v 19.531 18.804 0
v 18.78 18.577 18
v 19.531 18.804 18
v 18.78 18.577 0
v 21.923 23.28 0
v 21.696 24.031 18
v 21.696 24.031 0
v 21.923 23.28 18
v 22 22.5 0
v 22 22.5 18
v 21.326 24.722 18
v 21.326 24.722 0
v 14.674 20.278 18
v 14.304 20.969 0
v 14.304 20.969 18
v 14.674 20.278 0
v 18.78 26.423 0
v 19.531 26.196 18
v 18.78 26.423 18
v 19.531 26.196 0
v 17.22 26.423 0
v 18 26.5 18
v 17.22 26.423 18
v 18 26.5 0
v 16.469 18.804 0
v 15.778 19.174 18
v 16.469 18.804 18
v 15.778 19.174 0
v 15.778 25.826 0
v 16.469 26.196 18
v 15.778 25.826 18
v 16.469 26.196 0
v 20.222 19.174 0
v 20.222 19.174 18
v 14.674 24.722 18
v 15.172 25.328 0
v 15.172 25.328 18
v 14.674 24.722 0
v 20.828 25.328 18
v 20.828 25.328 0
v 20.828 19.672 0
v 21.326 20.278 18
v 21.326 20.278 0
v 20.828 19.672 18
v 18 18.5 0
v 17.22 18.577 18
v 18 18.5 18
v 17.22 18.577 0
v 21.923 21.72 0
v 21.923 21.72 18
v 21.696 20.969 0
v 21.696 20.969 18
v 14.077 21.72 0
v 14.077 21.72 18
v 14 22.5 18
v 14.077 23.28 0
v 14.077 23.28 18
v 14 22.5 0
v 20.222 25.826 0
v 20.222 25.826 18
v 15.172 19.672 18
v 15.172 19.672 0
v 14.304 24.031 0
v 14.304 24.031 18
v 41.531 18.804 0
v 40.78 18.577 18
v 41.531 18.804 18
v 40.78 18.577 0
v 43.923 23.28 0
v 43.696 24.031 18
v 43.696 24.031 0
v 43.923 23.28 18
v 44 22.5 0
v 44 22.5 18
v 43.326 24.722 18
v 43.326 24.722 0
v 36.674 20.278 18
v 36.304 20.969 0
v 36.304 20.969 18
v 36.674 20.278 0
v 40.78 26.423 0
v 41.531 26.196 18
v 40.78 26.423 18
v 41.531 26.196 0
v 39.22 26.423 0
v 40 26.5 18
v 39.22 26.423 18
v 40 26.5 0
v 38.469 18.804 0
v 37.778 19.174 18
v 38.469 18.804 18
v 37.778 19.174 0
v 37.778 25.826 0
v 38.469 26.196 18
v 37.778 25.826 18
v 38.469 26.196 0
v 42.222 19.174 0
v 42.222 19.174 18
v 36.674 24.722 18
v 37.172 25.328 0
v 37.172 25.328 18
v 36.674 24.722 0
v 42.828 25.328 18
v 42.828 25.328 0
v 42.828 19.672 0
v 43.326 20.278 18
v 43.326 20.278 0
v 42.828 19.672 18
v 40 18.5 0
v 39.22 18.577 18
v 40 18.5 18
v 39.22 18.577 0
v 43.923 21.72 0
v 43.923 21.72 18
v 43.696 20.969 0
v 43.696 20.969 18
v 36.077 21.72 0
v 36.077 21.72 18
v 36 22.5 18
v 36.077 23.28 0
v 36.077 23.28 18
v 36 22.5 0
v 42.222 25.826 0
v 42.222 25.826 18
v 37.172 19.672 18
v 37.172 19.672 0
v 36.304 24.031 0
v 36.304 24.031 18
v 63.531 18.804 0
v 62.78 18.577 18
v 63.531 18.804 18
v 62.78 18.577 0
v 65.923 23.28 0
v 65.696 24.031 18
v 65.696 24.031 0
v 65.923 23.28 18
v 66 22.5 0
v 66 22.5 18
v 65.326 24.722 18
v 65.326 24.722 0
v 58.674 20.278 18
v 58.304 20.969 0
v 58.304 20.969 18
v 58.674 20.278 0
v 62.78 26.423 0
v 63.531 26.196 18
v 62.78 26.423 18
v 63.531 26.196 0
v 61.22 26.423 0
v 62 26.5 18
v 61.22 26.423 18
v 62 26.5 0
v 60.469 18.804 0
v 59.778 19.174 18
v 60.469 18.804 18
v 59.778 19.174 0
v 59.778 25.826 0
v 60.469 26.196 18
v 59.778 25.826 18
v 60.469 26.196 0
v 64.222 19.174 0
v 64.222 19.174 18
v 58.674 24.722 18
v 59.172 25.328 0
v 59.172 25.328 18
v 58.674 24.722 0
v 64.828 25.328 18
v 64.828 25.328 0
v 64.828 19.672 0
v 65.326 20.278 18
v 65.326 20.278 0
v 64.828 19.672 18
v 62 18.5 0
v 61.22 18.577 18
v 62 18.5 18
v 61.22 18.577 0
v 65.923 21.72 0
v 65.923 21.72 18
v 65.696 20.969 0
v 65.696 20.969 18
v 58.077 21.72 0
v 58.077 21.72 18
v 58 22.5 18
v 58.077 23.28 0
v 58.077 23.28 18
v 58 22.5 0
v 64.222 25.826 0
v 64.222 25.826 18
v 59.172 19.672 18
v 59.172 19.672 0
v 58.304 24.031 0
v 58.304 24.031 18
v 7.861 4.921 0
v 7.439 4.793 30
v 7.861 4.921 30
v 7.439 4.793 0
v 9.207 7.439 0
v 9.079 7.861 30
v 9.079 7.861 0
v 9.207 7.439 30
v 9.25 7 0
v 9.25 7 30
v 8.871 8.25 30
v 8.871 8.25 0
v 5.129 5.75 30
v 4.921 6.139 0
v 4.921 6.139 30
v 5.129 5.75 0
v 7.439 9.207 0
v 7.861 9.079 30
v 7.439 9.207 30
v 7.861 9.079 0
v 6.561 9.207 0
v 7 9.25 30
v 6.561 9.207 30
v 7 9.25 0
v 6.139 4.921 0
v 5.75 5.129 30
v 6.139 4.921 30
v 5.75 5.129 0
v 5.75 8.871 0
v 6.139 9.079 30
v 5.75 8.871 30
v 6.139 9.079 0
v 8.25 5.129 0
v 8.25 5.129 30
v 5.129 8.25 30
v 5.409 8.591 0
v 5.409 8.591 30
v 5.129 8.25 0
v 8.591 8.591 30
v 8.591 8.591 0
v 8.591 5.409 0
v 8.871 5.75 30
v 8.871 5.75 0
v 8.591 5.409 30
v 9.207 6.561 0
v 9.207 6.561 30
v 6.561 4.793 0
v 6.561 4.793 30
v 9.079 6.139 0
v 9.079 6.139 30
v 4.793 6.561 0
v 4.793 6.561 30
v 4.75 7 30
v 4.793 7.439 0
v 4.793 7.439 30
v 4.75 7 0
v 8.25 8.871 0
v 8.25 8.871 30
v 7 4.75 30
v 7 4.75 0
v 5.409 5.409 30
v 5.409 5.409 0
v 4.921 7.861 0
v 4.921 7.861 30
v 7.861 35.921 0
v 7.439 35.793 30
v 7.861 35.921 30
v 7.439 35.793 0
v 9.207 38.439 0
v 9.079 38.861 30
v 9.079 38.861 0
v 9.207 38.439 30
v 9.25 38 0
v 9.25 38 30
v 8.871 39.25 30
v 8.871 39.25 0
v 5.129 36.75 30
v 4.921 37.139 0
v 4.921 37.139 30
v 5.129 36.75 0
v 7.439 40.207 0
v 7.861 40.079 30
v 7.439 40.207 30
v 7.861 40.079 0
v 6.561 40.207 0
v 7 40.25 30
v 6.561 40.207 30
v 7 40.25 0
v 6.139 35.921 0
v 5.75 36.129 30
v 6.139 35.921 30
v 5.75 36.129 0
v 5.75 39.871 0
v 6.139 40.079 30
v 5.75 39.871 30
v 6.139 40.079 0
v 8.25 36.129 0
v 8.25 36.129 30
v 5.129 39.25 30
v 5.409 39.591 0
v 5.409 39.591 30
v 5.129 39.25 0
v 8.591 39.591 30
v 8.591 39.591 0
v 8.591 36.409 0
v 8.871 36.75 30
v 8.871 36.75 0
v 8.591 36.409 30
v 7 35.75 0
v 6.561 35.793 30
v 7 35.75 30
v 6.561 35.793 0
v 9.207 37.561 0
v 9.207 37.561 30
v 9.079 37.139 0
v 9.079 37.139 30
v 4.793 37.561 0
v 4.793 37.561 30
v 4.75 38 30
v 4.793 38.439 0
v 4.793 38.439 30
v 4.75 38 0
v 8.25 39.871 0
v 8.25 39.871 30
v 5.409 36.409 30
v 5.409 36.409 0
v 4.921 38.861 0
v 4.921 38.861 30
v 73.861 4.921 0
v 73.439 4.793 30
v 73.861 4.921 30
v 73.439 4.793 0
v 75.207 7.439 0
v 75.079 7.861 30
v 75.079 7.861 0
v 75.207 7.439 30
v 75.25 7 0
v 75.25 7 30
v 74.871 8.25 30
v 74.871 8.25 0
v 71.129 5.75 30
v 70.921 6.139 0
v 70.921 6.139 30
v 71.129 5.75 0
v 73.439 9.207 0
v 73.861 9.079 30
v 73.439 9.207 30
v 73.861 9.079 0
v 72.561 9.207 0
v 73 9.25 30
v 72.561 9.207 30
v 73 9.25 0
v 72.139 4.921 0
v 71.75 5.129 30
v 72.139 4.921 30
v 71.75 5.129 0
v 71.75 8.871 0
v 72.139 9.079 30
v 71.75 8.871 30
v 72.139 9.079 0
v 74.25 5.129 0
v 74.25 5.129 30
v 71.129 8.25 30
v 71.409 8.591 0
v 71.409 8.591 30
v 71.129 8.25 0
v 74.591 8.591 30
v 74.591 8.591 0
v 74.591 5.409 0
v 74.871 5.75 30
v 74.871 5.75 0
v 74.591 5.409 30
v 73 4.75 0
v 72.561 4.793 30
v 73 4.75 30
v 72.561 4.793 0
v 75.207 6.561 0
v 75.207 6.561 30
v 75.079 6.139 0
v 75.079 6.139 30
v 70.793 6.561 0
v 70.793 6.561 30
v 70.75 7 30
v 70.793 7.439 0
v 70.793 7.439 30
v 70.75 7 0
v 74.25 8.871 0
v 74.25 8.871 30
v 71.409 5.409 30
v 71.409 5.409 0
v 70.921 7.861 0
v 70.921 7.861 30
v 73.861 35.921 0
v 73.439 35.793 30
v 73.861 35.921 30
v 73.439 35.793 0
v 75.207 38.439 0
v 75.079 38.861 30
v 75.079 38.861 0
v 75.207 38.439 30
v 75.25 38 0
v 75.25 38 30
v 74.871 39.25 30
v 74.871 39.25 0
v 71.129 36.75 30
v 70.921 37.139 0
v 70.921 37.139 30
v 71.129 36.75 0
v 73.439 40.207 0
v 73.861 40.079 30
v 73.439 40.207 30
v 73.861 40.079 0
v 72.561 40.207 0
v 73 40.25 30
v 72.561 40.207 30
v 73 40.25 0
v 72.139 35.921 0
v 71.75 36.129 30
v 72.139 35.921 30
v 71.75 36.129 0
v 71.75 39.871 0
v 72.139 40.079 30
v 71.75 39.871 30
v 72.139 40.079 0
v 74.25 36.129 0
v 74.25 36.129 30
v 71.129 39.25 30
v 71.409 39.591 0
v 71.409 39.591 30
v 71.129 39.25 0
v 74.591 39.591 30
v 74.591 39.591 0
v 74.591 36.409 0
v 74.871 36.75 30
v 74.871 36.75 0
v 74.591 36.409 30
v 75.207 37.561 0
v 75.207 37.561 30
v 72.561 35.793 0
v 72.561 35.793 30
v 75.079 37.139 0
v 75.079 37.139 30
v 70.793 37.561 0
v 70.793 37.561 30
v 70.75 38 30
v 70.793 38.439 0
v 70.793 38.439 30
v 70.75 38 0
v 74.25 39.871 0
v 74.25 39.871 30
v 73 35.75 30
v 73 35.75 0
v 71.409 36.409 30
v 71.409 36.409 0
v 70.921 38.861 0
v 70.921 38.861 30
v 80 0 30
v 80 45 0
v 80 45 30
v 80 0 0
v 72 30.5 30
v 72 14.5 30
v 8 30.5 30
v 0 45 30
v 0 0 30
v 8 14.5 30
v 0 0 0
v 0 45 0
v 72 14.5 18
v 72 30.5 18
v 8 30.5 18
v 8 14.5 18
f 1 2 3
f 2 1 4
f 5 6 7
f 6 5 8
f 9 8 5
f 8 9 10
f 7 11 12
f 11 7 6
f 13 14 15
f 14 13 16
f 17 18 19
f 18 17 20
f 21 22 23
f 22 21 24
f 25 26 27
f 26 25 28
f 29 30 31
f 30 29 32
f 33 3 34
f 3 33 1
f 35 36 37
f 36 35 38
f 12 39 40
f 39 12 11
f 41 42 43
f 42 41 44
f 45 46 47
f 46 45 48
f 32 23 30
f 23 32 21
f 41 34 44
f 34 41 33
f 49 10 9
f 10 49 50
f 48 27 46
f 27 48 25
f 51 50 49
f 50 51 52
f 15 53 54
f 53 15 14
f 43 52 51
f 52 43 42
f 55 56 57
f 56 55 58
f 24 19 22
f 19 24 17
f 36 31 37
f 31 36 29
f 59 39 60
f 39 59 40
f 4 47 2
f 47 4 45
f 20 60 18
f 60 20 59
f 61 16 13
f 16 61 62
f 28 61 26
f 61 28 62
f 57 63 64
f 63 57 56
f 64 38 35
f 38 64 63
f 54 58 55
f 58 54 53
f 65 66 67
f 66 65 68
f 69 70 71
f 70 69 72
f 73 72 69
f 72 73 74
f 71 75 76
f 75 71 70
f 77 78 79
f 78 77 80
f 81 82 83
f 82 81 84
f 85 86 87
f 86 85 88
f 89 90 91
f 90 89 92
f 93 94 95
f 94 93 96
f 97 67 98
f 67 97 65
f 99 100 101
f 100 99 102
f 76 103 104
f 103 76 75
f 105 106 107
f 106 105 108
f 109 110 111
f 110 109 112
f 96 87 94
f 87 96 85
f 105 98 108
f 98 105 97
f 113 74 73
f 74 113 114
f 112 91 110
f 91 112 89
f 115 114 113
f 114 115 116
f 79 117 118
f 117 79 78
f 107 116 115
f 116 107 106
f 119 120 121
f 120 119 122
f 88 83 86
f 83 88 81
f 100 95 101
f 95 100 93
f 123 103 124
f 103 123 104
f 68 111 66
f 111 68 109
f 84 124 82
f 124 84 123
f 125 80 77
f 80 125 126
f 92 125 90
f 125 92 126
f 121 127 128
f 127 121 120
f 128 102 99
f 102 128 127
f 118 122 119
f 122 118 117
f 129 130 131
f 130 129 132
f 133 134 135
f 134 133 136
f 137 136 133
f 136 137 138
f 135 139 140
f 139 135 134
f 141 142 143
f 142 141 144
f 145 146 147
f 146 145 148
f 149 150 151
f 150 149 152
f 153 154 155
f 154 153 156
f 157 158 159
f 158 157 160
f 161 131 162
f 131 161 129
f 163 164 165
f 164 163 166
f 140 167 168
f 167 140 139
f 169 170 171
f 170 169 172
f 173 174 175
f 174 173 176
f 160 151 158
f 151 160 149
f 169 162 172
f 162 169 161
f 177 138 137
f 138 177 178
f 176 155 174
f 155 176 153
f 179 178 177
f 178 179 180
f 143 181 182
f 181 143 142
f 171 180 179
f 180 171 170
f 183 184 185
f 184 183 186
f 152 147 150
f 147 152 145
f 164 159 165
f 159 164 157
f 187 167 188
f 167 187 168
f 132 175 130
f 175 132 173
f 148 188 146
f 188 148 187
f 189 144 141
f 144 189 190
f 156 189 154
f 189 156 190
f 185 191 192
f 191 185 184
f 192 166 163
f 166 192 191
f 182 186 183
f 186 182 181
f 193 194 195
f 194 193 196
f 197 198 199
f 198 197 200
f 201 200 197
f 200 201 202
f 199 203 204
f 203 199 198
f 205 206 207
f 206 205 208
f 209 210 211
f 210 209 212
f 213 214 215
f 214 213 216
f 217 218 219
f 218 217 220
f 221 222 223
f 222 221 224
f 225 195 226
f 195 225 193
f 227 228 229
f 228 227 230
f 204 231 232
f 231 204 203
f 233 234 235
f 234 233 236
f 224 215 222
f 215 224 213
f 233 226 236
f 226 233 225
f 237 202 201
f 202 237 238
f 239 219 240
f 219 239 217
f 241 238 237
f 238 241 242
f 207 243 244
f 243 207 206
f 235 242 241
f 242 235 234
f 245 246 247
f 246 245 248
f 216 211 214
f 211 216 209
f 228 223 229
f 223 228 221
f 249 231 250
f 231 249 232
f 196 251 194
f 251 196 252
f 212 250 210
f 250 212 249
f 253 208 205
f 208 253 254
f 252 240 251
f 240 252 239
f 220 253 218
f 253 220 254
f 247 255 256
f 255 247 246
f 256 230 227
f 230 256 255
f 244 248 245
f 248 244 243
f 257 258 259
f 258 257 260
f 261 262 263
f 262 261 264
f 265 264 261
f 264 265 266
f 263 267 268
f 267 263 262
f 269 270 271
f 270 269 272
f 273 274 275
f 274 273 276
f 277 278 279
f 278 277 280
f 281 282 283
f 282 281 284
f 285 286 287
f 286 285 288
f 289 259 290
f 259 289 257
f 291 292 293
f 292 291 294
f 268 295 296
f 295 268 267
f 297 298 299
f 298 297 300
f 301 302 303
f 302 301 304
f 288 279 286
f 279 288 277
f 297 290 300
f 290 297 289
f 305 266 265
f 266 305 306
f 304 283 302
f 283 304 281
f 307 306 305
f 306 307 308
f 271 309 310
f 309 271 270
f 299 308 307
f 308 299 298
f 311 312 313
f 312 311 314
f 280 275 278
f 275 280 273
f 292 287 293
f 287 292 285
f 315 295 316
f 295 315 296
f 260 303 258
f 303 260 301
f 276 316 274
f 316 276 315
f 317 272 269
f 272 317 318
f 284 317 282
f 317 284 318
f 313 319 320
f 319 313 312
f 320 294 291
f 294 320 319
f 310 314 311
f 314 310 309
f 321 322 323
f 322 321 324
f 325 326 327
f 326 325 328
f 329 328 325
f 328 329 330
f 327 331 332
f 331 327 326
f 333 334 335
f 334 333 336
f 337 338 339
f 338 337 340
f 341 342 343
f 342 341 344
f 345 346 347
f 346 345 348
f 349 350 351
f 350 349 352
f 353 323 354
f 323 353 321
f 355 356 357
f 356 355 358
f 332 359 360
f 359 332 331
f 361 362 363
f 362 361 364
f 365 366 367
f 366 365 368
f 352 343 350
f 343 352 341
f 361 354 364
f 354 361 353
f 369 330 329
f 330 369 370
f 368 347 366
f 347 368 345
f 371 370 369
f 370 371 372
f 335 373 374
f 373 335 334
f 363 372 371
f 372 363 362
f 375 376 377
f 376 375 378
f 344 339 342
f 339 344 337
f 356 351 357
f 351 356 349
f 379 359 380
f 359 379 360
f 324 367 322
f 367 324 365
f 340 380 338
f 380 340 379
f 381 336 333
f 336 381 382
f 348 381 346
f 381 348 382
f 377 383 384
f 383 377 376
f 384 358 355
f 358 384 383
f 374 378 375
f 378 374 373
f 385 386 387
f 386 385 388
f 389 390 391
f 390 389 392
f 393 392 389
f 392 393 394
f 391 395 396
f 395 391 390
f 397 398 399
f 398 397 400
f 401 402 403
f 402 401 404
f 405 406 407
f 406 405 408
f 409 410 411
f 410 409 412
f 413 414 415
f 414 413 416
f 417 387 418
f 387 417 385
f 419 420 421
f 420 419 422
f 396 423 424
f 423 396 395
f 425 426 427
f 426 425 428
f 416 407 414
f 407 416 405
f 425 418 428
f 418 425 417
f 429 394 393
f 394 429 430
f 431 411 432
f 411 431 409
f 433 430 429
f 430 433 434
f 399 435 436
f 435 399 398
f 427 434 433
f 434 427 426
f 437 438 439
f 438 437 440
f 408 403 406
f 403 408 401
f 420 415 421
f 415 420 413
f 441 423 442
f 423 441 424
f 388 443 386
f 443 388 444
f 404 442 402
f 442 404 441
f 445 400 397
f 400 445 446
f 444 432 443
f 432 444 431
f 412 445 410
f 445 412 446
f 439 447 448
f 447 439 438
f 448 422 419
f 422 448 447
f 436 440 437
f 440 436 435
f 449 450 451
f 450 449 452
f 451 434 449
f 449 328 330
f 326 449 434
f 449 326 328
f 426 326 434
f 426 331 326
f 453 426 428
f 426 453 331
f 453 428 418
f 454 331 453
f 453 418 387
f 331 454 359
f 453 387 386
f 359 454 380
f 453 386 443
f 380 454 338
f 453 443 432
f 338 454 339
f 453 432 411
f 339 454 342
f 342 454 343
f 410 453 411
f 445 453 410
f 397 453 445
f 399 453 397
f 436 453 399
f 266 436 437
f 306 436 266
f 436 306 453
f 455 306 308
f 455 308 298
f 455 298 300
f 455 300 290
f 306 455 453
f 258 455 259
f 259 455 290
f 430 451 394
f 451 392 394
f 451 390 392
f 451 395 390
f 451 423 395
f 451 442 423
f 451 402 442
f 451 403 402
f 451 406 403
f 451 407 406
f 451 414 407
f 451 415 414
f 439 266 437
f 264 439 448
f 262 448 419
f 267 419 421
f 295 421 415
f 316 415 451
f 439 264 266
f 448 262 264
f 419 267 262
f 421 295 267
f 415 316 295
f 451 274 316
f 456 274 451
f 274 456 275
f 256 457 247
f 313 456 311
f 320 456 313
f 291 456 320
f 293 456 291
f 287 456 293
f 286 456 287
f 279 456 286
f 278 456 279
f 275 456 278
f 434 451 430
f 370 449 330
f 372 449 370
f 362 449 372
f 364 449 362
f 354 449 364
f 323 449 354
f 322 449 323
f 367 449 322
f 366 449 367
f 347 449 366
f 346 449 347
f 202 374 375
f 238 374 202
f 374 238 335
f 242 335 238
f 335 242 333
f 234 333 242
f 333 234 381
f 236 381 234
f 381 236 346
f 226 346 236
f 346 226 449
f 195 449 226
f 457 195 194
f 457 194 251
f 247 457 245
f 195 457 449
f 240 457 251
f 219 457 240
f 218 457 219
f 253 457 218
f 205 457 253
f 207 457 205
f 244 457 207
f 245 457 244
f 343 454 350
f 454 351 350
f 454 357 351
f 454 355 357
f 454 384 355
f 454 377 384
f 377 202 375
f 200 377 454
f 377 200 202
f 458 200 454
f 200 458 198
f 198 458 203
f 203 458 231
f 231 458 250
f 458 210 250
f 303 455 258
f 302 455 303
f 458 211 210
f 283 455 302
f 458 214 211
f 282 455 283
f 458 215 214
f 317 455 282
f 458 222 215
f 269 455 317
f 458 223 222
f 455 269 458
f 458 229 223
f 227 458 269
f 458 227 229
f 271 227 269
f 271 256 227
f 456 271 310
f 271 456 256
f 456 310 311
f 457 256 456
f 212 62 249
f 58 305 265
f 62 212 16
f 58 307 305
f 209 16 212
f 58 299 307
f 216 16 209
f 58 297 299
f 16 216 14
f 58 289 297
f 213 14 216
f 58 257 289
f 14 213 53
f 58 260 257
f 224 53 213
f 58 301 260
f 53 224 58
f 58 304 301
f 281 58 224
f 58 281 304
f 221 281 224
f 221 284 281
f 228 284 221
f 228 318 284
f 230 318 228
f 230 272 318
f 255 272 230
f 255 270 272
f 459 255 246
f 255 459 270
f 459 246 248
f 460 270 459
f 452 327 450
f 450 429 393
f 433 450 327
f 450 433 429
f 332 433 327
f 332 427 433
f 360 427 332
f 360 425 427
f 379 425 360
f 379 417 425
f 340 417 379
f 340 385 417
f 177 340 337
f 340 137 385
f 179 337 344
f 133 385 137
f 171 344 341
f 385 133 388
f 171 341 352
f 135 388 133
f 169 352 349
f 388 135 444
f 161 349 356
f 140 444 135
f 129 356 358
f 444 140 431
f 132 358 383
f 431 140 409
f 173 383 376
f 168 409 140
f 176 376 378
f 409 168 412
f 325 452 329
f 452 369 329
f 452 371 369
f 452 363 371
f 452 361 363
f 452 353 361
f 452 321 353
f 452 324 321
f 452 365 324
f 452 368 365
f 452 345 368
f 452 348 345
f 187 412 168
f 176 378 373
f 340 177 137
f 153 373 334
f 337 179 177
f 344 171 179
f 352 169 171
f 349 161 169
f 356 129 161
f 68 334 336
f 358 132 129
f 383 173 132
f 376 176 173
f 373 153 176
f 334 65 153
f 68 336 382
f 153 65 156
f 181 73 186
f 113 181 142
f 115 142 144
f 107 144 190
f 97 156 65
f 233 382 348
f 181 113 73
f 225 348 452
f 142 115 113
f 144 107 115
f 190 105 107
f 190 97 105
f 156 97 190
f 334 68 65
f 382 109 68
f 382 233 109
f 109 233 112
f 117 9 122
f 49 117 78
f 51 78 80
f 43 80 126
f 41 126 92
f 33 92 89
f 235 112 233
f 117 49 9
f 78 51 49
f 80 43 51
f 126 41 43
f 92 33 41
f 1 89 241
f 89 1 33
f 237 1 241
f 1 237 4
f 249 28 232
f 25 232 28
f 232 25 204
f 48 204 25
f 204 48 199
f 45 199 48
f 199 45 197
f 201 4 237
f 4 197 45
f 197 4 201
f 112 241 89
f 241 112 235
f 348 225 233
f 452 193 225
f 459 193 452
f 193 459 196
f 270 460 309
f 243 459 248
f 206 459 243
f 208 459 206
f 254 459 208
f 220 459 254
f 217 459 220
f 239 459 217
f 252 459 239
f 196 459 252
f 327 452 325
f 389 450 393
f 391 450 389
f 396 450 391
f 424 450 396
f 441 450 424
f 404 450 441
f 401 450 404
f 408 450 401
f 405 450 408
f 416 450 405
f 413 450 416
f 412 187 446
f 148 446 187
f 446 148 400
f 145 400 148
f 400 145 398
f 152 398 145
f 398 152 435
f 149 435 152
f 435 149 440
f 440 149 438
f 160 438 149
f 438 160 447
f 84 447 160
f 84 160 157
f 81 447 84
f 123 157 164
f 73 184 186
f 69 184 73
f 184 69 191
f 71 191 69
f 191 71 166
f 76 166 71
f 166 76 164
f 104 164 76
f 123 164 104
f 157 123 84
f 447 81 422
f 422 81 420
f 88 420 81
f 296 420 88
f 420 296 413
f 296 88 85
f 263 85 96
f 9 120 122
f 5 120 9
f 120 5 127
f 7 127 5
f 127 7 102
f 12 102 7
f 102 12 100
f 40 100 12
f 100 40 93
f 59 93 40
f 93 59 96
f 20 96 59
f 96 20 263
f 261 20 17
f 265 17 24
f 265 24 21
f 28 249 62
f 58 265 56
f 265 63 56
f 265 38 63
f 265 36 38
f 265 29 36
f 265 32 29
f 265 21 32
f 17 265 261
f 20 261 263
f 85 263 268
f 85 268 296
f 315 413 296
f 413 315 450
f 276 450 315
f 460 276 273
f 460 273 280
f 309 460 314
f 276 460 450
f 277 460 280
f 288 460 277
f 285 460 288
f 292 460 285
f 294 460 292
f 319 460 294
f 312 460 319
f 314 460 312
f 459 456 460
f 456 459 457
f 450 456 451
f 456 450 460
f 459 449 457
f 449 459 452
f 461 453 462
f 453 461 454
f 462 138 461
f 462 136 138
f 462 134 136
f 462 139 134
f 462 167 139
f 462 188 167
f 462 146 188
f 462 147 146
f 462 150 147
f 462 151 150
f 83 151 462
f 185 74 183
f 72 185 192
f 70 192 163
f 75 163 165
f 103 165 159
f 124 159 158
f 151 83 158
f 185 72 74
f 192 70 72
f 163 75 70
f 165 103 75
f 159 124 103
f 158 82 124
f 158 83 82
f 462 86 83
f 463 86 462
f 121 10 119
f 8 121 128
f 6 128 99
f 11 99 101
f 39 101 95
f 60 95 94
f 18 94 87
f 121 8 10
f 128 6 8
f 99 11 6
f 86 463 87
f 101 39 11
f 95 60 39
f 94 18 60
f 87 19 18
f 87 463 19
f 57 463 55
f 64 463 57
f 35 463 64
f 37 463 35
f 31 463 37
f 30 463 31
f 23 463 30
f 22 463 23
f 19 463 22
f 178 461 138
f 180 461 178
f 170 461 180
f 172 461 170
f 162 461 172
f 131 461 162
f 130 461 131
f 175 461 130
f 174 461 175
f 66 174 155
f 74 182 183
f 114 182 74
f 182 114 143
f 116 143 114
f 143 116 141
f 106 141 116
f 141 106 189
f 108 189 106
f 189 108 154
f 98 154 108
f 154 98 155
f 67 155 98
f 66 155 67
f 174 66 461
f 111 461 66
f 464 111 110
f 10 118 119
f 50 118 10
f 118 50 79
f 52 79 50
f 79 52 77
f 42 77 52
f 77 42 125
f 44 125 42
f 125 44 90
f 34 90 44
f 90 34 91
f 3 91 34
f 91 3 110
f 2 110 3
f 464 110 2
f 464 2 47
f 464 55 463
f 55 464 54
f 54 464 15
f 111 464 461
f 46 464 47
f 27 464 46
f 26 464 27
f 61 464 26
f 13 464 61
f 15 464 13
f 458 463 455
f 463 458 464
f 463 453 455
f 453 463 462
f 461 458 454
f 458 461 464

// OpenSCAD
$fn = 32;

// ----------------------------------------------------------------------
// Manifold block: gallery_top manifold
// ----------------------------------------------------------------------

// --- parameters (mm) ---
block_l = 80;             // block length, X
block_w = 45;             // block width, Y
block_h = 30;             // block height, Z
port_d = 8;               // port bore diameter
port_pitch = 22;          // port pitch along X
gallery_d = 16;           // top gallery width, Y
gallery_depth = 12;       // gallery pocket depth
wall_p = 8;               // gallery end wall thickness, X
mnt_d = 4.5;              // mounting hole diameter
mnt_in = 7;               // mounting hole inset from the edges

n_ports = 3;  // ports in the row
port_x0 = (block_l - (n_ports - 1) * port_pitch) / 2;  // first port X

difference() {
  cube([block_l, block_w, block_h]);
  for (i = [0 : n_ports - 1])
    translate([port_x0 + i * port_pitch, block_w / 2, -1])
      cylinder(h = block_h + 2, d = port_d);
  translate([wall_p, block_w / 2 - gallery_d / 2, block_h - gallery_depth])
    cube([block_l - 2 * wall_p, gallery_d, gallery_depth + 1]);
  for (cx = [mnt_in, block_l - mnt_in])
    for (cy = [mnt_in, block_w - mnt_in])
      translate([cx, cy, -1]) cylinder(h = block_h + 2, d = mnt_d);
}
